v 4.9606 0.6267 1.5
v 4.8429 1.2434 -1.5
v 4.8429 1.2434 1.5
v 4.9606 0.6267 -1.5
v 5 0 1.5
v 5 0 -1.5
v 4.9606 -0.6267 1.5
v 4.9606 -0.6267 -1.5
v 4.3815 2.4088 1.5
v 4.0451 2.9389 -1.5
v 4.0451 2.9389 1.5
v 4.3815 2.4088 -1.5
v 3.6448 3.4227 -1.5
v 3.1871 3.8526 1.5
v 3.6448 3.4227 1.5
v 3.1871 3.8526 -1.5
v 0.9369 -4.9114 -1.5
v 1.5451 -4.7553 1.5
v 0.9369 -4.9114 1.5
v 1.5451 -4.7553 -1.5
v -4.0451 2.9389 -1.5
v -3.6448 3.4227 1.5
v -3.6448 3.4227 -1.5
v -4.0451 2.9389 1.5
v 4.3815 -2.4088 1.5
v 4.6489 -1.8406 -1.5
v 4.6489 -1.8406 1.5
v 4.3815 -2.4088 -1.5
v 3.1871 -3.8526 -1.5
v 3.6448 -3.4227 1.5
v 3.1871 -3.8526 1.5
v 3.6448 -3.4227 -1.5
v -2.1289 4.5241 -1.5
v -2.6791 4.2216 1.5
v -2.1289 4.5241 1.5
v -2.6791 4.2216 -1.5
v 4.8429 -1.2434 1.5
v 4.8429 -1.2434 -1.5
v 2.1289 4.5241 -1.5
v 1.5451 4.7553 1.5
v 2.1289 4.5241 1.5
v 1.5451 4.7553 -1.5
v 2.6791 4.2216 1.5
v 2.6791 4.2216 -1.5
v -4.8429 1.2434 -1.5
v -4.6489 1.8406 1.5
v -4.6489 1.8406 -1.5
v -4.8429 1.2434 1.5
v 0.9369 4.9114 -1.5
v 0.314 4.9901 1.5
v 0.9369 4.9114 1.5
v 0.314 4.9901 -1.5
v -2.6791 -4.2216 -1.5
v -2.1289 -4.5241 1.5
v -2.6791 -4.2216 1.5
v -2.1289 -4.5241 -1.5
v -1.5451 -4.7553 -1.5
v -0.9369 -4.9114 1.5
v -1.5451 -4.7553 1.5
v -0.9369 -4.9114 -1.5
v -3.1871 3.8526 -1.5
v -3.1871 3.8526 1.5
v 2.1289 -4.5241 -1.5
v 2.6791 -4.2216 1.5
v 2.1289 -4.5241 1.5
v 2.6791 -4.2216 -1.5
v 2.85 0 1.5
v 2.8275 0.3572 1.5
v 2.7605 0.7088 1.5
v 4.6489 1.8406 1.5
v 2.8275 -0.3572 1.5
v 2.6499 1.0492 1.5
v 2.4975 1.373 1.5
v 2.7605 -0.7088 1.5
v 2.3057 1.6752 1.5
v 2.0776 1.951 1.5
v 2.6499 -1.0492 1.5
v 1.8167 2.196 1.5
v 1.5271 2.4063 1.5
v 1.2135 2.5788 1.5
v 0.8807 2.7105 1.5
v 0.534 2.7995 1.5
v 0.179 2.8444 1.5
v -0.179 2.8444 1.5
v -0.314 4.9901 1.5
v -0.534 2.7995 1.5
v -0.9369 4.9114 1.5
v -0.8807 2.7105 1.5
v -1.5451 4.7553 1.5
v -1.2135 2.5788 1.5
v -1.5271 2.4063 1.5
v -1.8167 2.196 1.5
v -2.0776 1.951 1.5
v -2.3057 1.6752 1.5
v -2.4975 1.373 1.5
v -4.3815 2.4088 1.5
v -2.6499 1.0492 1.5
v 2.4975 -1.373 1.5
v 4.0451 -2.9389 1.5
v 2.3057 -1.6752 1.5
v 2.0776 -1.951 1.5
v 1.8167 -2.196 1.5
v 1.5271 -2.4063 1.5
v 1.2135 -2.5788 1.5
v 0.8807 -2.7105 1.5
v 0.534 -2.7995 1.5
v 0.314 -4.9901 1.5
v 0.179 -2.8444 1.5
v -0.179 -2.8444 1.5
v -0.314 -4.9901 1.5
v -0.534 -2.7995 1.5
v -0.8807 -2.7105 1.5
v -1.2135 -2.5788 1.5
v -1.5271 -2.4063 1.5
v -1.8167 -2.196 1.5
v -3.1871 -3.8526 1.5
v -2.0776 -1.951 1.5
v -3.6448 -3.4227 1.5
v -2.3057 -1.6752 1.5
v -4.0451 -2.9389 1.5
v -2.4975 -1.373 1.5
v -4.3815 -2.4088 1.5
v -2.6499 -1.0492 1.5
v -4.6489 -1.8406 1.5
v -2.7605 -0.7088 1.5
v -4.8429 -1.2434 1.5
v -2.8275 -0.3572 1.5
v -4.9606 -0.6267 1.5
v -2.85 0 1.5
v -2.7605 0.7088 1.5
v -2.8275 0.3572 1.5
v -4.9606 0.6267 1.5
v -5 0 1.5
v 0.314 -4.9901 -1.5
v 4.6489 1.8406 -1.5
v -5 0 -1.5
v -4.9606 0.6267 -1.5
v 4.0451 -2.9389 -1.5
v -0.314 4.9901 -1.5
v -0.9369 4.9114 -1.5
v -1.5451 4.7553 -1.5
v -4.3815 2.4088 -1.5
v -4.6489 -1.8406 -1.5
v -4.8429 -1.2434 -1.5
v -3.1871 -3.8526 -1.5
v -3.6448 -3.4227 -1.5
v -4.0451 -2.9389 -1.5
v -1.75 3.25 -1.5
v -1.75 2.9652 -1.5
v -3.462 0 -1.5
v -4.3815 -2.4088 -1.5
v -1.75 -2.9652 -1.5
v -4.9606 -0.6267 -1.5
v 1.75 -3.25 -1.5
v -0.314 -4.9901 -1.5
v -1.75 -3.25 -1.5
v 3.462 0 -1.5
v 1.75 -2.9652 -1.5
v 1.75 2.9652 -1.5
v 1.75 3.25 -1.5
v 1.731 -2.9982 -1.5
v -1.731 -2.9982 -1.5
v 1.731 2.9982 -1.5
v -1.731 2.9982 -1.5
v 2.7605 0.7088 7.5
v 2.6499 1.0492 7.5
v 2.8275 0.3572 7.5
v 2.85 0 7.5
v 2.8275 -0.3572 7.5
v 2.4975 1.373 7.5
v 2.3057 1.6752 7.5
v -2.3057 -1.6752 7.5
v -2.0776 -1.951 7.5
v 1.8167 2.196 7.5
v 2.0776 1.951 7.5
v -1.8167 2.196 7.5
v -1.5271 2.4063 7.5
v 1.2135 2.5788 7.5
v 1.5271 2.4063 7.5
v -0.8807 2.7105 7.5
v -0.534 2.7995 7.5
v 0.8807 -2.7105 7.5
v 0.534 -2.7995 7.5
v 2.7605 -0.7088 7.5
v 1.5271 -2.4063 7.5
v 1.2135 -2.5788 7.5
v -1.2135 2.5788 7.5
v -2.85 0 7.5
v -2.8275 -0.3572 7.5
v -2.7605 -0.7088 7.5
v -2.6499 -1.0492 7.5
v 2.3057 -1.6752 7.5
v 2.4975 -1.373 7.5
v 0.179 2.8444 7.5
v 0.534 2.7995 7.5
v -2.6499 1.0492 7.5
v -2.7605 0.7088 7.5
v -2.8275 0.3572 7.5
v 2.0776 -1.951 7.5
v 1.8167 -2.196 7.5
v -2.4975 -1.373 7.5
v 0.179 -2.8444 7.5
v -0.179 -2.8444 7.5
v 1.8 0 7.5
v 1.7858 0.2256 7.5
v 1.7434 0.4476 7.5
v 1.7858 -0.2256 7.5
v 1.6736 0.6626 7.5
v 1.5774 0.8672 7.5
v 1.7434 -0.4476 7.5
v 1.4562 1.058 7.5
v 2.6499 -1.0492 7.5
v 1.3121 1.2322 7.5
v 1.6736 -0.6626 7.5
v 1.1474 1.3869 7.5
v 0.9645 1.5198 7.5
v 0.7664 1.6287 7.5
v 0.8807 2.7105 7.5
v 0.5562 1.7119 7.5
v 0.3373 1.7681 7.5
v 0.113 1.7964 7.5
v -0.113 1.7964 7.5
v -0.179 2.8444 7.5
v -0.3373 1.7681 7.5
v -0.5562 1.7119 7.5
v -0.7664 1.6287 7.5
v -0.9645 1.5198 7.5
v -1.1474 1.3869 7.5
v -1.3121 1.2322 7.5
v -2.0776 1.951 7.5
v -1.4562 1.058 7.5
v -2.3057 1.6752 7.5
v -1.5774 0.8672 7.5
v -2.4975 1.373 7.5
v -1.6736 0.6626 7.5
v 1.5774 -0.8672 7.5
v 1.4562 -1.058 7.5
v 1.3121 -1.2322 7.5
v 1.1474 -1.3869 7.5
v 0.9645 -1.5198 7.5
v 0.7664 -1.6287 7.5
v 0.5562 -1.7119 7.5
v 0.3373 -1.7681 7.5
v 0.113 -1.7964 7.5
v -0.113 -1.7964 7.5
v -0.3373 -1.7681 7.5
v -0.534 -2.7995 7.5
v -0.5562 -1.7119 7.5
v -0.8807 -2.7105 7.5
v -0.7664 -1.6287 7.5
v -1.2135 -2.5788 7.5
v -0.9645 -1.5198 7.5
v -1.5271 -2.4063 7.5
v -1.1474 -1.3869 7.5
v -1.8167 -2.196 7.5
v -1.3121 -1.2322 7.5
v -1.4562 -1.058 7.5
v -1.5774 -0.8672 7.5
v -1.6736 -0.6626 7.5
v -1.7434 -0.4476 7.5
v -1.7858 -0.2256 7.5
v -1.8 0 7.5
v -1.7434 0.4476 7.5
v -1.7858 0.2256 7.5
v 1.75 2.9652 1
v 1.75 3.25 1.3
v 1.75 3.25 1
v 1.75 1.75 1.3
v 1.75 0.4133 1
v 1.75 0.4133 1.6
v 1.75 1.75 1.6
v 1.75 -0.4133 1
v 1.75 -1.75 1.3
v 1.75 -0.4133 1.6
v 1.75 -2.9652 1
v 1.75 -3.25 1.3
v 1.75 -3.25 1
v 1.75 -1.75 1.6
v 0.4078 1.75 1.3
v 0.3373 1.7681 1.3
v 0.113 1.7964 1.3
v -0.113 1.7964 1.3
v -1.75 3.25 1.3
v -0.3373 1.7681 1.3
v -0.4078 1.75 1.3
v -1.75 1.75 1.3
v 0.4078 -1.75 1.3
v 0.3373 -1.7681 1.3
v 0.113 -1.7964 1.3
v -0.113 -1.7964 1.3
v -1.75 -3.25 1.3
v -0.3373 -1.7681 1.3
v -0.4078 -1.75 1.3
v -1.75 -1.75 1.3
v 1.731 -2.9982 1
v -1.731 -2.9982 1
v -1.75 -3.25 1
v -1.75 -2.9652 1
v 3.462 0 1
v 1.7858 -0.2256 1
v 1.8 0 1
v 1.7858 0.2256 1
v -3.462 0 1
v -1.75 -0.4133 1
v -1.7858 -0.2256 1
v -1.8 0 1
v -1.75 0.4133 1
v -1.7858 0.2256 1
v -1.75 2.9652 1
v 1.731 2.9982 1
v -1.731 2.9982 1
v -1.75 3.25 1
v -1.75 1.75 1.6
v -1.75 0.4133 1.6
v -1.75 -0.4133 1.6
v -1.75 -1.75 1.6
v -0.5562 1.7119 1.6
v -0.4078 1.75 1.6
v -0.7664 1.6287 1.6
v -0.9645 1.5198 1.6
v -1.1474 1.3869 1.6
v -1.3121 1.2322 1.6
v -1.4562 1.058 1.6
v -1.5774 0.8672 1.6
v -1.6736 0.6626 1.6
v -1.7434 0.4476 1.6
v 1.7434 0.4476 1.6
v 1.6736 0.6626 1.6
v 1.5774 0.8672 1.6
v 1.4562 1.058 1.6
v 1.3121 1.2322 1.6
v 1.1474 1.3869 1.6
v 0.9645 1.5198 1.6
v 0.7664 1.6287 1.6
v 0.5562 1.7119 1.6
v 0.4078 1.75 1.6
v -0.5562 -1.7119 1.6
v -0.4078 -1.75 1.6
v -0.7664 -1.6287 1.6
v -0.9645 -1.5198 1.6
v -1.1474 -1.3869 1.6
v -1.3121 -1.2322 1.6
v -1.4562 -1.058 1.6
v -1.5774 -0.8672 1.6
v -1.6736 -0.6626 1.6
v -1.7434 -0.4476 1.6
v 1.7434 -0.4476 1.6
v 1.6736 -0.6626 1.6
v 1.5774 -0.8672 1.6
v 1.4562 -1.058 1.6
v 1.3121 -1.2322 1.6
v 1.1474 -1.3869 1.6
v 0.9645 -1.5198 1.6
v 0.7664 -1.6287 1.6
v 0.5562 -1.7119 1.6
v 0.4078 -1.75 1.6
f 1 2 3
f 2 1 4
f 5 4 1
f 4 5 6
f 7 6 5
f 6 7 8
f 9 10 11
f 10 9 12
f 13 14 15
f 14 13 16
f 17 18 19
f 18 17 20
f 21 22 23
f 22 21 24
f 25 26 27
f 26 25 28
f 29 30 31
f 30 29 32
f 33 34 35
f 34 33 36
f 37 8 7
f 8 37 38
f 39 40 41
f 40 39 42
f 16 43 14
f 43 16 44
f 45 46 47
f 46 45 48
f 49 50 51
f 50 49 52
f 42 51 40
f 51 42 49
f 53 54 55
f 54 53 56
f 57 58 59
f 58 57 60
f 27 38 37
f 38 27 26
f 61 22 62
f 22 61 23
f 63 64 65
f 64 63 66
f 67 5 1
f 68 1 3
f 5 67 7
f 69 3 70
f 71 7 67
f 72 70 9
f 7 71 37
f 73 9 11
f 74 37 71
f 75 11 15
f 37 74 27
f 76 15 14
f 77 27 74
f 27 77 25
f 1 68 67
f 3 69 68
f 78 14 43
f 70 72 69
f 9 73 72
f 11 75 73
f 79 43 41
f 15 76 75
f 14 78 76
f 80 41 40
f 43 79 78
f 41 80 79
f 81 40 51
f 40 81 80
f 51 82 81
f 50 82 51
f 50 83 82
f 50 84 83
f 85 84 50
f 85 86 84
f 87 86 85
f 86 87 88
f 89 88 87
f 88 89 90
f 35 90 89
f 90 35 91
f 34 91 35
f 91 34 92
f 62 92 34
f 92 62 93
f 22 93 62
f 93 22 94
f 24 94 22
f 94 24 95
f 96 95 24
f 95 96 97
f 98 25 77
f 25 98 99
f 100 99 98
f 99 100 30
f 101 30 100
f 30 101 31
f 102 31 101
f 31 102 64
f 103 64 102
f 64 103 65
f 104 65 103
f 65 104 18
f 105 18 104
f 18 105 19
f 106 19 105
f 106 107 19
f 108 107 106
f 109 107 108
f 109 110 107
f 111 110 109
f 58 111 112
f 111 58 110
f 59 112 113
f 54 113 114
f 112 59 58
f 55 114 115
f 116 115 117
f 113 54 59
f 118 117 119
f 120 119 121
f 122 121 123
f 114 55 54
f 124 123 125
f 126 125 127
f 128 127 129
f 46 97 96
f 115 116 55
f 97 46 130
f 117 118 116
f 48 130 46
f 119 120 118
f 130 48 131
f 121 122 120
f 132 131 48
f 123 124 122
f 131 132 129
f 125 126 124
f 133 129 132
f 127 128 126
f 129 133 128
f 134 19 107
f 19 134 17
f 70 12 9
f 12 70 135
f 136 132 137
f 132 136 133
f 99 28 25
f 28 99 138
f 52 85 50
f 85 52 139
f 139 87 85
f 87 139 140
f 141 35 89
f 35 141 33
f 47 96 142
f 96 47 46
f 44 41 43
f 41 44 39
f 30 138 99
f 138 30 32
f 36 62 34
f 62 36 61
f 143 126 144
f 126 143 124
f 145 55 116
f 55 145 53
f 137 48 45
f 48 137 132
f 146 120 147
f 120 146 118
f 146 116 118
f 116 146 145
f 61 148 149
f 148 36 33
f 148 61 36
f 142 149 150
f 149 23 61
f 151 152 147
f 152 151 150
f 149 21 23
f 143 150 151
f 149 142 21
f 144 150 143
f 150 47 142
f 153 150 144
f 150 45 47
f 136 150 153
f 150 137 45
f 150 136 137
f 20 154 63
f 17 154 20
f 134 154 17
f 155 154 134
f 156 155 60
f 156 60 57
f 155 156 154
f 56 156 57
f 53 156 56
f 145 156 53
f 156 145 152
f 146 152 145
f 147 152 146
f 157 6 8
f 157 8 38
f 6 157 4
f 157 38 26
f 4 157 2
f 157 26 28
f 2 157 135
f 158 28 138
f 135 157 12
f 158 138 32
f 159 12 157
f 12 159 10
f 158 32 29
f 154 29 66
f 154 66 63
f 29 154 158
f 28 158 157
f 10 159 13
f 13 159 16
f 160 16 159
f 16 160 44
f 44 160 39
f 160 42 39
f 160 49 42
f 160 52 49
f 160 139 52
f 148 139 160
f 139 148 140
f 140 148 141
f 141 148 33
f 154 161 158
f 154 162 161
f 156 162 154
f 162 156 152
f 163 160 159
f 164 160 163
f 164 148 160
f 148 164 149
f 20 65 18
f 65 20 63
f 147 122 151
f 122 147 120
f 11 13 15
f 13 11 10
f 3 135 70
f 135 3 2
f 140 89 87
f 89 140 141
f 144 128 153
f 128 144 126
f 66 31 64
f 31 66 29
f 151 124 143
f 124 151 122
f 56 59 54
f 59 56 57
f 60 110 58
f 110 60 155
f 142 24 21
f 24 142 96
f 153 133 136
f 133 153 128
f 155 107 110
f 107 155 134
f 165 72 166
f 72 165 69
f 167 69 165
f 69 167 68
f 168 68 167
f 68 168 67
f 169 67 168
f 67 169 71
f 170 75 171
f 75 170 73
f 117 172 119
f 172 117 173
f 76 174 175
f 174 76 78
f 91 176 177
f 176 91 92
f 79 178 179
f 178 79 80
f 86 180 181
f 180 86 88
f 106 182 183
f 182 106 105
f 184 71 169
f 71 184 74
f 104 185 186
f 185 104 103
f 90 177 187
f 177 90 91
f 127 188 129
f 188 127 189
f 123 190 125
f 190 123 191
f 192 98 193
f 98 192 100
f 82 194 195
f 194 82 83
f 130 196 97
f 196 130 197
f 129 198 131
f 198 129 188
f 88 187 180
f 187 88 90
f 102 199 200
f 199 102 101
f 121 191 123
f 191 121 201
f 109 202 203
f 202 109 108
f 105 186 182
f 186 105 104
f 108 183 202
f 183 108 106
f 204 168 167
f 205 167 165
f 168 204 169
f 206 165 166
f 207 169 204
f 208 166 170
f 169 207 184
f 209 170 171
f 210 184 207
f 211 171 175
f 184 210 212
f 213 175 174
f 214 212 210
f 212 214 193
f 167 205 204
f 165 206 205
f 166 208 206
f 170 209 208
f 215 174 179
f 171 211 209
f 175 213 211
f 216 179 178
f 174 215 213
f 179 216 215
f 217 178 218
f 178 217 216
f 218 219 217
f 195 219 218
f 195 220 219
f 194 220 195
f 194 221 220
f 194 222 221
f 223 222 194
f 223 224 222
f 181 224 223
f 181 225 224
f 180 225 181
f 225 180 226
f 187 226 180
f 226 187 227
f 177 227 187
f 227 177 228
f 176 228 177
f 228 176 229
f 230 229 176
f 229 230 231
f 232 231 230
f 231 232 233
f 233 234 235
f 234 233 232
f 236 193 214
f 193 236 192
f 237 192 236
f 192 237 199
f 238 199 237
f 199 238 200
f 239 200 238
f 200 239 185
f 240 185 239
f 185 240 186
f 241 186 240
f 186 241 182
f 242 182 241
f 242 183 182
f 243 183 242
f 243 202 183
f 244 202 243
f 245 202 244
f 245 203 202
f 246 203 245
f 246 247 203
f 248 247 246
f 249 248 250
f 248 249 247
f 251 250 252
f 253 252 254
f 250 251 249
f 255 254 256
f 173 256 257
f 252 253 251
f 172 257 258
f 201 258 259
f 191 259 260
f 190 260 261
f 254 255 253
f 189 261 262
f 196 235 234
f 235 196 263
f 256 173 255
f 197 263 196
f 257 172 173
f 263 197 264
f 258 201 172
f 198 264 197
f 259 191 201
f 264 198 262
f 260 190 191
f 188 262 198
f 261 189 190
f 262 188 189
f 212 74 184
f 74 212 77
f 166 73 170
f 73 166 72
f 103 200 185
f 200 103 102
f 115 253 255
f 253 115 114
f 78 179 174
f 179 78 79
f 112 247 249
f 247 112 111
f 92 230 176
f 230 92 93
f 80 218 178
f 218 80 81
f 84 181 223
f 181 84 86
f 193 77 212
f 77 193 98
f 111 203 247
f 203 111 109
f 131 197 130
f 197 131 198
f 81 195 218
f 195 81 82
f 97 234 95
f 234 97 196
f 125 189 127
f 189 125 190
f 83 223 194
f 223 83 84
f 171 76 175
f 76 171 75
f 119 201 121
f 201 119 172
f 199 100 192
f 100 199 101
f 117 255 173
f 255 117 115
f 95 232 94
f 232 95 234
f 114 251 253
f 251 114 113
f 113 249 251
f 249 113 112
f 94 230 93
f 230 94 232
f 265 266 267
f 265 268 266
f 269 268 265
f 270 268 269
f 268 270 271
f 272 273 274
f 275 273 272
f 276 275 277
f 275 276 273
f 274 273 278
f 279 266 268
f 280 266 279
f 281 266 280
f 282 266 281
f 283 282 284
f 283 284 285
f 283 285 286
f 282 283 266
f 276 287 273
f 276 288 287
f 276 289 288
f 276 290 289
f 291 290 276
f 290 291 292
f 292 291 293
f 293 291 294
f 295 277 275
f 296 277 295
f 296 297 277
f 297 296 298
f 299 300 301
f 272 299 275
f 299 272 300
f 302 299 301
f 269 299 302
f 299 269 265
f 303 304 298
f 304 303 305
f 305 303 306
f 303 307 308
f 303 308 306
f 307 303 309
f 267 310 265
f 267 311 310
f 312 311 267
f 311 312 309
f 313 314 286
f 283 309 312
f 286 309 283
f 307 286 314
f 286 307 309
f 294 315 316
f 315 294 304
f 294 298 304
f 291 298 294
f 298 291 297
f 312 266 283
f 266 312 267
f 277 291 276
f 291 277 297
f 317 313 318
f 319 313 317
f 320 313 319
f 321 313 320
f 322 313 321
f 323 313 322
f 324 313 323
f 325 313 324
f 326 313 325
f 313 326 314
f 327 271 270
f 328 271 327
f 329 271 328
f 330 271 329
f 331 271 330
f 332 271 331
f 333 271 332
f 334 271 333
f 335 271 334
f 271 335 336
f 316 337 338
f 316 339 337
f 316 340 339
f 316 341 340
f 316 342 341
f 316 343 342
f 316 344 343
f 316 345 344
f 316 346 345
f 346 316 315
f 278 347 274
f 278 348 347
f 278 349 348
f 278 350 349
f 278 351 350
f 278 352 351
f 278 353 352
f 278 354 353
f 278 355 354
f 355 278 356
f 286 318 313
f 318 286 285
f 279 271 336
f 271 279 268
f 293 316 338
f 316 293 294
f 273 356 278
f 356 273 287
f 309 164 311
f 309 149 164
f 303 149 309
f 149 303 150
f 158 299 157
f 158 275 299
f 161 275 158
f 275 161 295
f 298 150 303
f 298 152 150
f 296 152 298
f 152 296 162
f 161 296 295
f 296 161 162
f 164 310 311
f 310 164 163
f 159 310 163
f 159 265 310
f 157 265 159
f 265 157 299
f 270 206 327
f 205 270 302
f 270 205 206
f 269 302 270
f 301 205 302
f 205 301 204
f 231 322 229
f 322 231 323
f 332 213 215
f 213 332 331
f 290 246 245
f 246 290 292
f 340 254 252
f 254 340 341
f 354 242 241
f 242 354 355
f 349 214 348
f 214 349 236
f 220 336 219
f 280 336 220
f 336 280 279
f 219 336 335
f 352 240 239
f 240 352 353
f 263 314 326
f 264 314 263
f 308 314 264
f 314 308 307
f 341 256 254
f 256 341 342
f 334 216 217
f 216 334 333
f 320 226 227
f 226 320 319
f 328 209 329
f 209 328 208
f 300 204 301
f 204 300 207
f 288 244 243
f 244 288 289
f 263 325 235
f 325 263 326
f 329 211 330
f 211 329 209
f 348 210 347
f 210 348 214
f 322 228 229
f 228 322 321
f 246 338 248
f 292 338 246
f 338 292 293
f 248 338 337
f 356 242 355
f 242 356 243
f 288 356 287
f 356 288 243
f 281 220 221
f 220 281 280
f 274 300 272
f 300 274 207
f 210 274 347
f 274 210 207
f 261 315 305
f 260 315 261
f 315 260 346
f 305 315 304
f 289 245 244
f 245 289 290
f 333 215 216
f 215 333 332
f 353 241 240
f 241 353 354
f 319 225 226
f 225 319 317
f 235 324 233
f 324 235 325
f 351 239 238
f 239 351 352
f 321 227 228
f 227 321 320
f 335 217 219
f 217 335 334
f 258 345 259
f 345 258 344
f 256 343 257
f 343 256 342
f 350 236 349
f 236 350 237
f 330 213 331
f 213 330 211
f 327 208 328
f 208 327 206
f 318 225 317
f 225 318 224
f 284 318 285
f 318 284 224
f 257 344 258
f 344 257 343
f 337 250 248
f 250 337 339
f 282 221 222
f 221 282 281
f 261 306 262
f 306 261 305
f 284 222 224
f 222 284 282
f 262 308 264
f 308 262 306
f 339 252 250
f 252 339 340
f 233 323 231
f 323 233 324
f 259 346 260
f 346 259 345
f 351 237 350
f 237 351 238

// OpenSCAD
$fn = 50;


difference() {
	union() {
		translate(v = [0, 0, -1.5000000000]) {
			cylinder(h = 3, r = 5.0000000000);
		}
		translate(v = [0, 0, -1.5000000000]) {
			cylinder(h = 9, r = 2.8500000000);
		}
	}
	union() {
		translate(v = [0, 0, -1.5000000000]) {
			rotate(a = [0, 0, 0]) {
				difference() {
					union() {
						translate(v = [-1.7500000000, -3.2500000000, -0.3000000000]) {
							cube(size = [3.5000000000, 6.5000000000, 0.3000000000]);
						}
						translate(v = [-1.7500000000, -1.7500000000, -0.6000000000]) {
							cube(size = [3.5000000000, 3.5000000000, 0.3000000000]);
						}
						translate(v = [-1.7500000000, -3.2500000000, 2.5000000000]) {
							cube(size = [3.5000000000, 6.5000000000, 0.3000000000]);
						}
						translate(v = [-1.7500000000, -1.7500000000, 2.8000000000]) {
							cube(size = [3.5000000000, 3.5000000000, 0.3000000000]);
						}
						linear_extrude(height = 2.5000000000) {
							polygon(points = [[3.4620000000, 0.0000000000], [1.7310000000, 2.9981799479], [-1.7310000000, 2.9981799479], [-3.4620000000, 0.0000000000], [-1.7310000000, -2.9981799479], [1.7310000000, -2.9981799479]]);
						}
						translate(v = [-1.7500000000, -3.2500000000, -0.3000000000]) {
							cube(size = [3.5000000000, 6.5000000000, 0.3000000000]);
						}
						translate(v = [-1.7500000000, -1.7500000000, -0.6000000000]) {
							cube(size = [3.5000000000, 3.5000000000, 0.3000000000]);
						}
						translate(v = [-1.7500000000, -3.2500000000, 2.5000000000]) {
							cube(size = [3.5000000000, 6.5000000000, 0.3000000000]);
						}
						translate(v = [-1.7500000000, -1.7500000000, 2.8000000000]) {
							cube(size = [3.5000000000, 3.5000000000, 0.3000000000]);
						}
						translate(v = [-1.7500000000, -3.2500000000, -0.3000000000]) {
							cube(size = [3.5000000000, 6.5000000000, 0.3000000000]);
						}
						translate(v = [-1.7500000000, -1.7500000000, -0.6000000000]) {
							cube(size = [3.5000000000, 3.5000000000, 0.3000000000]);
						}
						translate(v = [-1.7500000000, -3.2500000000, 2.5000000000]) {
							cube(size = [3.5000000000, 6.5000000000, 0.3000000000]);
						}
						translate(v = [-1.7500000000, -1.7500000000, 2.8000000000]) {
							cube(size = [3.5000000000, 3.5000000000, 0.3000000000]);
						}
					}
					union();
				}
			}
		}
		translate(v = [0, 0, -100.0000000000]) {
			cylinder(h = 200, r = 1.8000000000);
		}
	}
}
